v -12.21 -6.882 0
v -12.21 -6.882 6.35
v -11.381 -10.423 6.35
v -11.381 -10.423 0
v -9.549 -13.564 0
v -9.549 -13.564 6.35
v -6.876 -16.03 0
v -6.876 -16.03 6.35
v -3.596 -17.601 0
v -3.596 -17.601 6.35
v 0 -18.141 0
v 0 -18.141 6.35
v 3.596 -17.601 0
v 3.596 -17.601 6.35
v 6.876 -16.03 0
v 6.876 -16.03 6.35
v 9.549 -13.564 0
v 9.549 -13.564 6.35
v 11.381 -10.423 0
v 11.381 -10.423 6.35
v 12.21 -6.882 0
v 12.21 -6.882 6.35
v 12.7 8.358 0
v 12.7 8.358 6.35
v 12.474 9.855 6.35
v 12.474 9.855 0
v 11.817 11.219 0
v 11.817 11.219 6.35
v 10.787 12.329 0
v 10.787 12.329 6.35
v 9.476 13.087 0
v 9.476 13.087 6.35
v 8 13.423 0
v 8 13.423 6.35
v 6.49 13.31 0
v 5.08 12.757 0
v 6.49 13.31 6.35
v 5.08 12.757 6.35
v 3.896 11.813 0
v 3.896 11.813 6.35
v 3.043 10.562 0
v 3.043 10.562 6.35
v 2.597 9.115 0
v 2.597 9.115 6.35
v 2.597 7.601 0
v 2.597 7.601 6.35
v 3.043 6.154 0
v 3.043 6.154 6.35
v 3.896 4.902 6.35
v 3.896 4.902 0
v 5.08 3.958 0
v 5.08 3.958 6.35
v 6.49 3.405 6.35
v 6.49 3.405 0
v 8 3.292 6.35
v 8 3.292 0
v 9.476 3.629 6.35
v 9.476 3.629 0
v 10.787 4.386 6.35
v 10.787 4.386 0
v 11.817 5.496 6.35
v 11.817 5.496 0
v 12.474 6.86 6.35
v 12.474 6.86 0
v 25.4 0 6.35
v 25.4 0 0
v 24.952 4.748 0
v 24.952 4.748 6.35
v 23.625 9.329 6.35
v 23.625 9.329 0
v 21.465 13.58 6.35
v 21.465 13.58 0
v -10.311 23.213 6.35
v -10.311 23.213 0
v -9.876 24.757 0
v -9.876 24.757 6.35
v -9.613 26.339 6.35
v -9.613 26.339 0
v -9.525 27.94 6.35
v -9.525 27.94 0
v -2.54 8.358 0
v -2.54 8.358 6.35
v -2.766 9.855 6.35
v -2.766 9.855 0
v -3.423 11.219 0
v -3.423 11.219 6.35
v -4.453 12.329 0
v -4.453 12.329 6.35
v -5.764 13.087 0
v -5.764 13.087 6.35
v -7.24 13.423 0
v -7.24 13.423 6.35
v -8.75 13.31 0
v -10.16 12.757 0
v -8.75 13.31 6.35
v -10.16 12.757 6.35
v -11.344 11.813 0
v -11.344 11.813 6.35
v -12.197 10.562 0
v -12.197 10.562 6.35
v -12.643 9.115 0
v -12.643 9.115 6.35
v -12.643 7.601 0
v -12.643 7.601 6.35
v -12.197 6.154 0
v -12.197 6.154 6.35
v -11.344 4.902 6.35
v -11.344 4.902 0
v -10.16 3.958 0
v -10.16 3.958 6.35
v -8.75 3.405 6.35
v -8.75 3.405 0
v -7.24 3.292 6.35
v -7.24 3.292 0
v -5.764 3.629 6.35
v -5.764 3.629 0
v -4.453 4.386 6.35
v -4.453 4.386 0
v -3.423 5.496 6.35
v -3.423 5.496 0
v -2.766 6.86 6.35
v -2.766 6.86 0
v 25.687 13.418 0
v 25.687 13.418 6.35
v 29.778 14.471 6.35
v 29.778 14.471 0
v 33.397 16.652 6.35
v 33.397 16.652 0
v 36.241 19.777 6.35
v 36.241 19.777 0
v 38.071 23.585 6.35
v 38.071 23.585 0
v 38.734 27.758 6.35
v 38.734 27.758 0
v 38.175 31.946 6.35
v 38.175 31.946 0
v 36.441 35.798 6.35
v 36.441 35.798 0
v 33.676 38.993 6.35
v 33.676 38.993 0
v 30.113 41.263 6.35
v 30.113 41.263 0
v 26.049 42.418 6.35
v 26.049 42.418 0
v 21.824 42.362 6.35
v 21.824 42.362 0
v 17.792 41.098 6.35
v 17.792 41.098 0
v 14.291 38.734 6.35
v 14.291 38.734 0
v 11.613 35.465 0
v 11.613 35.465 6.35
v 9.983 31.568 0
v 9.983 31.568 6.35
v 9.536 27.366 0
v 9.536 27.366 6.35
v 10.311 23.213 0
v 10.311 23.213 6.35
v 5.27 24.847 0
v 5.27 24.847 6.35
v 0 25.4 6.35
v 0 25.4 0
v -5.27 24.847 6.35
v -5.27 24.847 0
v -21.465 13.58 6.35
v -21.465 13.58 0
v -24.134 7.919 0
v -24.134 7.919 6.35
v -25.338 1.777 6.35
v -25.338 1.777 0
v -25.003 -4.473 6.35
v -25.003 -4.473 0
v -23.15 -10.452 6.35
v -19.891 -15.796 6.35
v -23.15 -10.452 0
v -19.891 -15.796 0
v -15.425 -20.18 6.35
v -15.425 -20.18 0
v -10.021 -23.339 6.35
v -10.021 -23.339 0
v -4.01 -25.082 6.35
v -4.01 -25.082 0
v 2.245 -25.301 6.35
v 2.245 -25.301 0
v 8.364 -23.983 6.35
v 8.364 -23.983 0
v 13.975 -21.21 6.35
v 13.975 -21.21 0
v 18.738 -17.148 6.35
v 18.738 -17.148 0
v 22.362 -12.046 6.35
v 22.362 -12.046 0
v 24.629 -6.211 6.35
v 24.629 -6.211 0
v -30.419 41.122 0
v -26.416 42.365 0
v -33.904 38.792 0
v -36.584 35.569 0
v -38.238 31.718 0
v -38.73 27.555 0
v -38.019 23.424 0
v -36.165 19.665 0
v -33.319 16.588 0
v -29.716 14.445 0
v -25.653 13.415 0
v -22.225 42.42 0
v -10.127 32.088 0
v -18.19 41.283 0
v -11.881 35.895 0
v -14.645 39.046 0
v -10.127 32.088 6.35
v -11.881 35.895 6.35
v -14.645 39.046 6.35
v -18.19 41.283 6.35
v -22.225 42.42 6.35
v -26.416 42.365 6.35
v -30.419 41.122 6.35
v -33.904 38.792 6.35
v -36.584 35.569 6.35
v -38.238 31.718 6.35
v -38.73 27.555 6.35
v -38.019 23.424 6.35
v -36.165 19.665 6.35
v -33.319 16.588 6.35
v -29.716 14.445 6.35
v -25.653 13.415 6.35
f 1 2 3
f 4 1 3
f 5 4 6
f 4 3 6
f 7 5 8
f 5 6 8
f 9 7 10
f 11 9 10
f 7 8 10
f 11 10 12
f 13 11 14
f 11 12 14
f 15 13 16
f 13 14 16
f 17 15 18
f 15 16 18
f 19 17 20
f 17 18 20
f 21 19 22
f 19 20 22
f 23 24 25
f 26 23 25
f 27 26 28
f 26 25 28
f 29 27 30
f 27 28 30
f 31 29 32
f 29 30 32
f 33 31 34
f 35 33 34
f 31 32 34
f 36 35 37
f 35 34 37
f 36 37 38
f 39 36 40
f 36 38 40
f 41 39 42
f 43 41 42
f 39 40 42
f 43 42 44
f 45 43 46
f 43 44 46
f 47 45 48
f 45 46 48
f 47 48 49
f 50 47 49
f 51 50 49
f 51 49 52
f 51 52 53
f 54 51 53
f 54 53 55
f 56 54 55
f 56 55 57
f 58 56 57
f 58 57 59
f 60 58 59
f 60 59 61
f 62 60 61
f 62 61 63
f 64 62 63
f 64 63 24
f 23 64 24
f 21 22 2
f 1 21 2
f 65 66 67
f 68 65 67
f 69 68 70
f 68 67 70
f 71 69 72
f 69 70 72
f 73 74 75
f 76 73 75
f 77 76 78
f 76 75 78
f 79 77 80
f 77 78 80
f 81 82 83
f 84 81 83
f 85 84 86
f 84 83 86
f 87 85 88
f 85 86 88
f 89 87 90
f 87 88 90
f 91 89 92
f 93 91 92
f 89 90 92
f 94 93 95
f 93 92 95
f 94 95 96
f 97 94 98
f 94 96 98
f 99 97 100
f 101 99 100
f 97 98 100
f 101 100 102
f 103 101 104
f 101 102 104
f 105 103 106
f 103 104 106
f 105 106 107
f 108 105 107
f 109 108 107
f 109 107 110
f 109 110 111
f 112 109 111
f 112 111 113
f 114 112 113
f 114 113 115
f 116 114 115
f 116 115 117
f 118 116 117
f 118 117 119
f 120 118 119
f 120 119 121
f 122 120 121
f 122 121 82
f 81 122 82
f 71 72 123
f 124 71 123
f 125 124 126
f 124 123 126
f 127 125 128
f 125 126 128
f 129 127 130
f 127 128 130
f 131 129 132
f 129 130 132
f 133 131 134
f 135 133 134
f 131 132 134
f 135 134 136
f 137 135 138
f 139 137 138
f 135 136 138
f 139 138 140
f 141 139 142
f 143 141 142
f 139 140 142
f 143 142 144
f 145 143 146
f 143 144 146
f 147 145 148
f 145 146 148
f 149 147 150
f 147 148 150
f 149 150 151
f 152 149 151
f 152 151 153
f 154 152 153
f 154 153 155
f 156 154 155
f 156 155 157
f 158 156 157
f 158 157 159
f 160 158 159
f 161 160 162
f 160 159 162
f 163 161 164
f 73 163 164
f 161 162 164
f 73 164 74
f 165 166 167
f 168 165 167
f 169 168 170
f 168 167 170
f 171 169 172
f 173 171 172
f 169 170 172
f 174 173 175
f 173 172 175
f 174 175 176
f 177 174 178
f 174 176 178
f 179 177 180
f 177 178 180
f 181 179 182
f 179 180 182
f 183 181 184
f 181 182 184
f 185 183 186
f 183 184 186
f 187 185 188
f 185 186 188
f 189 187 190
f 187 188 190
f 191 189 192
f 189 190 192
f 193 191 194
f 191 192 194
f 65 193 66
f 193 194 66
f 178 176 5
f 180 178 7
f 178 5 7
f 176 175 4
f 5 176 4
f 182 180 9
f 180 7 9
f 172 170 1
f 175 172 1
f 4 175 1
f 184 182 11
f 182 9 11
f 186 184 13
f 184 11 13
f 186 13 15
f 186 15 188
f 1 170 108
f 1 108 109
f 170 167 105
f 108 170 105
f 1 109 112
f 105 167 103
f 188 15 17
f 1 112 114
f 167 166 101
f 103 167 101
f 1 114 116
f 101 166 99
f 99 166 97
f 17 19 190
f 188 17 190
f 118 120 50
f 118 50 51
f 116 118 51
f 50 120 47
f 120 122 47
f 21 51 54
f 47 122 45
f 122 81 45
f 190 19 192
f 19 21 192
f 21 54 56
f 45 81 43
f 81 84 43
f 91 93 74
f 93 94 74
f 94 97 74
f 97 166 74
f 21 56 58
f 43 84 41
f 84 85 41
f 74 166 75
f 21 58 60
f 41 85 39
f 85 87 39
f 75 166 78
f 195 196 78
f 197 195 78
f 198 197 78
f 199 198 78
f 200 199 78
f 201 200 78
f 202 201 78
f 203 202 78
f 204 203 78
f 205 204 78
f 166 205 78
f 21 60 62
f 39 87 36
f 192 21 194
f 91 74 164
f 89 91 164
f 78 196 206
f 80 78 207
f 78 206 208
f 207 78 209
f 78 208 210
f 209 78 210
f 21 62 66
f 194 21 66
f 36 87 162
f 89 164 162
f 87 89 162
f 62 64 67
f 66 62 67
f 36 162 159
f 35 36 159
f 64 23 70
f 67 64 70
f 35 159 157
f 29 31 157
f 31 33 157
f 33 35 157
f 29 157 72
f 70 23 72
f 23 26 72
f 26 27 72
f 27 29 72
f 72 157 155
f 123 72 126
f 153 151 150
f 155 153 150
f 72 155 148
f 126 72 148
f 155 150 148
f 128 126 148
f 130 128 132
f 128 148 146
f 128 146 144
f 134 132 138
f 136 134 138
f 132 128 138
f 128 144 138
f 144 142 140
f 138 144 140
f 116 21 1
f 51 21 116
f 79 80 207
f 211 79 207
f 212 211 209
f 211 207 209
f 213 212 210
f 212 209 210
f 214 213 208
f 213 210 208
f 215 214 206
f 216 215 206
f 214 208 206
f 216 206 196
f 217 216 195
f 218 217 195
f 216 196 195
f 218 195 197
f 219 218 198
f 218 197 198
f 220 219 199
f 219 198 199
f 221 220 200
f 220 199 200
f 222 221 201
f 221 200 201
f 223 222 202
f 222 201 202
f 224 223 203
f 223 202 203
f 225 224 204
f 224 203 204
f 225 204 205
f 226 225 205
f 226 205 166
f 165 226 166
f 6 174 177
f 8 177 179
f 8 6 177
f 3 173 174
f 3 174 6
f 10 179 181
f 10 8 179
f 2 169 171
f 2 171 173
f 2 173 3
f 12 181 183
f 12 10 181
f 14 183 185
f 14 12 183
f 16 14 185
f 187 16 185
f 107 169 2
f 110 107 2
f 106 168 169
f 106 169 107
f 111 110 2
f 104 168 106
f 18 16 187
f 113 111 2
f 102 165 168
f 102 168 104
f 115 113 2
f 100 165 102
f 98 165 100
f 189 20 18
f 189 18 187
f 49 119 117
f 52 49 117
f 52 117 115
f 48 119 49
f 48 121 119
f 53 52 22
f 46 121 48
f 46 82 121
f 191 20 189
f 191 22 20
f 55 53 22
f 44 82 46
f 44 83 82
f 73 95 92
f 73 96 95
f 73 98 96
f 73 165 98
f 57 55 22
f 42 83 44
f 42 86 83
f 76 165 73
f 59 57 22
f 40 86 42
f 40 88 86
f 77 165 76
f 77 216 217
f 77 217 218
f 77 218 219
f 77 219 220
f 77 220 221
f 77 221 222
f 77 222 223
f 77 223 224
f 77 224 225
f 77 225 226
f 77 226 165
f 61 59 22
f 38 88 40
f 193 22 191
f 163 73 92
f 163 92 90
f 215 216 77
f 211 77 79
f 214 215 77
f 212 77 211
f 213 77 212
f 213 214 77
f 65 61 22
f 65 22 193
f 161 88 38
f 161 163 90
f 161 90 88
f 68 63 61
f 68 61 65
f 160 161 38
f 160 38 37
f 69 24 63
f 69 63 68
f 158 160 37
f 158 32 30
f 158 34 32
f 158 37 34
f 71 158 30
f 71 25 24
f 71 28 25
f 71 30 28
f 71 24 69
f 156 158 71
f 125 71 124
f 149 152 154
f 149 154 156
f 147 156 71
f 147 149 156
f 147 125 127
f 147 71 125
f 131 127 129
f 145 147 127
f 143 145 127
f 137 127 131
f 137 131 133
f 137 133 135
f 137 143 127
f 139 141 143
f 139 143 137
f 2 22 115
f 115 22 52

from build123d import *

# Parameters (mm, degrees)
F1_DEPTH = 6.35
F4_DEPTH = 25.4
F5_R     = 5.08
F6_DEPTH = 25.4


with BuildPart() as f1:
    # F0 (on Top) → F1 (new body)
    with BuildSketch(Plane.XY):
        with BuildLine():
            ThreePointArc((-21.4647859524, 13.5802416775), (-7.0694567263, -24.396368205), (25.4, 0))
            ThreePointArc((25.4, 0), (24.396368205, 7.0694567263), (21.4647859524, 13.5802416775))
            ThreePointArc((21.4647859524, 13.5802416775), (14.5838817936, 16.8865999715), (10.3111400831, 23.2129358373))
            ThreePointArc((10.3111400831, 23.2129358373), (0, 25.4), (-10.3111400831, 23.2129358373))
            ThreePointArc((-10.3111400831, 23.2129358373), (-14.5838817936, 16.8865999715), (-21.4647859524, 13.5802416775))
        make_face()
        with BuildLine():
            ThreePointArc((-9.525, 27.94), (-35.360126361, 37.277573931), (-21.4647859524, 13.5802416775))
            ThreePointArc((-21.4647859524, 13.5802416775), (-16.6019447068, 19.2233043973), (-10.3111400831, 23.2129358373))
            ThreePointArc((-10.3111400831, 23.2129358373), (-9.7228754763, 25.544005852), (-9.525, 27.94))
        make_face()
        with BuildLine():
            ThreePointArc((-10.3111400831, 23.2129358373), (-16.6019447068, 19.2233043973), (-21.4647859524, 13.5802416775))
            ThreePointArc((-21.4647859524, 13.5802416775), (-14.5838817936, 16.8865999715), (-10.3111400831, 23.2129358373))
        make_face()
        with BuildLine():
            ThreePointArc((10.3111400831, 23.2129358373), (14.5838817936, 16.8865999715), (21.4647859524, 13.5802416775))
            ThreePointArc((21.4647859524, 13.5802416775), (16.6019447068, 19.2233043973), (10.3111400831, 23.2129358373))
        make_face()
        with BuildLine():
            ThreePointArc((10.3111400831, 23.2129358373), (16.6019447068, 19.2233043973), (21.4647859524, 13.5802416775))
            ThreePointArc((21.4647859524, 13.5802416775), (33.467573931, 16.709873639), (38.735, 27.94))
            ThreePointArc((38.735, 27.94), (21.734005852, 42.3471245237), (10.3111400831, 23.2129358373))
        make_face()
    extrude(amount=F1_DEPTH)

    # F3 (on face) → F4 (cut)
    with BuildSketch(Plane.XY.offset(6.35)):
        with BuildLine():
            Line((12.2104091206, -6.8823373568), (-12.2104091206, -6.8823373568))
            ThreePointArc((-12.2104091206, -6.8823373568), (0, -18.1409484321), (12.2104091206, -6.8823373568))
        make_face()
    extrude(amount=-F4_DEPTH, mode=Mode.SUBTRACT)

    # F5 (on face) → F6 (cut)
    with BuildSketch(Plane.XY.offset(6.35)):
        with Locations((-7.62, 8.3576626432)):
            Circle(F5_R)
        with Locations((7.62, 8.3576626432)):
            Circle(F5_R)
    extrude(amount=-F6_DEPTH, mode=Mode.SUBTRACT)


solid = f1.part
